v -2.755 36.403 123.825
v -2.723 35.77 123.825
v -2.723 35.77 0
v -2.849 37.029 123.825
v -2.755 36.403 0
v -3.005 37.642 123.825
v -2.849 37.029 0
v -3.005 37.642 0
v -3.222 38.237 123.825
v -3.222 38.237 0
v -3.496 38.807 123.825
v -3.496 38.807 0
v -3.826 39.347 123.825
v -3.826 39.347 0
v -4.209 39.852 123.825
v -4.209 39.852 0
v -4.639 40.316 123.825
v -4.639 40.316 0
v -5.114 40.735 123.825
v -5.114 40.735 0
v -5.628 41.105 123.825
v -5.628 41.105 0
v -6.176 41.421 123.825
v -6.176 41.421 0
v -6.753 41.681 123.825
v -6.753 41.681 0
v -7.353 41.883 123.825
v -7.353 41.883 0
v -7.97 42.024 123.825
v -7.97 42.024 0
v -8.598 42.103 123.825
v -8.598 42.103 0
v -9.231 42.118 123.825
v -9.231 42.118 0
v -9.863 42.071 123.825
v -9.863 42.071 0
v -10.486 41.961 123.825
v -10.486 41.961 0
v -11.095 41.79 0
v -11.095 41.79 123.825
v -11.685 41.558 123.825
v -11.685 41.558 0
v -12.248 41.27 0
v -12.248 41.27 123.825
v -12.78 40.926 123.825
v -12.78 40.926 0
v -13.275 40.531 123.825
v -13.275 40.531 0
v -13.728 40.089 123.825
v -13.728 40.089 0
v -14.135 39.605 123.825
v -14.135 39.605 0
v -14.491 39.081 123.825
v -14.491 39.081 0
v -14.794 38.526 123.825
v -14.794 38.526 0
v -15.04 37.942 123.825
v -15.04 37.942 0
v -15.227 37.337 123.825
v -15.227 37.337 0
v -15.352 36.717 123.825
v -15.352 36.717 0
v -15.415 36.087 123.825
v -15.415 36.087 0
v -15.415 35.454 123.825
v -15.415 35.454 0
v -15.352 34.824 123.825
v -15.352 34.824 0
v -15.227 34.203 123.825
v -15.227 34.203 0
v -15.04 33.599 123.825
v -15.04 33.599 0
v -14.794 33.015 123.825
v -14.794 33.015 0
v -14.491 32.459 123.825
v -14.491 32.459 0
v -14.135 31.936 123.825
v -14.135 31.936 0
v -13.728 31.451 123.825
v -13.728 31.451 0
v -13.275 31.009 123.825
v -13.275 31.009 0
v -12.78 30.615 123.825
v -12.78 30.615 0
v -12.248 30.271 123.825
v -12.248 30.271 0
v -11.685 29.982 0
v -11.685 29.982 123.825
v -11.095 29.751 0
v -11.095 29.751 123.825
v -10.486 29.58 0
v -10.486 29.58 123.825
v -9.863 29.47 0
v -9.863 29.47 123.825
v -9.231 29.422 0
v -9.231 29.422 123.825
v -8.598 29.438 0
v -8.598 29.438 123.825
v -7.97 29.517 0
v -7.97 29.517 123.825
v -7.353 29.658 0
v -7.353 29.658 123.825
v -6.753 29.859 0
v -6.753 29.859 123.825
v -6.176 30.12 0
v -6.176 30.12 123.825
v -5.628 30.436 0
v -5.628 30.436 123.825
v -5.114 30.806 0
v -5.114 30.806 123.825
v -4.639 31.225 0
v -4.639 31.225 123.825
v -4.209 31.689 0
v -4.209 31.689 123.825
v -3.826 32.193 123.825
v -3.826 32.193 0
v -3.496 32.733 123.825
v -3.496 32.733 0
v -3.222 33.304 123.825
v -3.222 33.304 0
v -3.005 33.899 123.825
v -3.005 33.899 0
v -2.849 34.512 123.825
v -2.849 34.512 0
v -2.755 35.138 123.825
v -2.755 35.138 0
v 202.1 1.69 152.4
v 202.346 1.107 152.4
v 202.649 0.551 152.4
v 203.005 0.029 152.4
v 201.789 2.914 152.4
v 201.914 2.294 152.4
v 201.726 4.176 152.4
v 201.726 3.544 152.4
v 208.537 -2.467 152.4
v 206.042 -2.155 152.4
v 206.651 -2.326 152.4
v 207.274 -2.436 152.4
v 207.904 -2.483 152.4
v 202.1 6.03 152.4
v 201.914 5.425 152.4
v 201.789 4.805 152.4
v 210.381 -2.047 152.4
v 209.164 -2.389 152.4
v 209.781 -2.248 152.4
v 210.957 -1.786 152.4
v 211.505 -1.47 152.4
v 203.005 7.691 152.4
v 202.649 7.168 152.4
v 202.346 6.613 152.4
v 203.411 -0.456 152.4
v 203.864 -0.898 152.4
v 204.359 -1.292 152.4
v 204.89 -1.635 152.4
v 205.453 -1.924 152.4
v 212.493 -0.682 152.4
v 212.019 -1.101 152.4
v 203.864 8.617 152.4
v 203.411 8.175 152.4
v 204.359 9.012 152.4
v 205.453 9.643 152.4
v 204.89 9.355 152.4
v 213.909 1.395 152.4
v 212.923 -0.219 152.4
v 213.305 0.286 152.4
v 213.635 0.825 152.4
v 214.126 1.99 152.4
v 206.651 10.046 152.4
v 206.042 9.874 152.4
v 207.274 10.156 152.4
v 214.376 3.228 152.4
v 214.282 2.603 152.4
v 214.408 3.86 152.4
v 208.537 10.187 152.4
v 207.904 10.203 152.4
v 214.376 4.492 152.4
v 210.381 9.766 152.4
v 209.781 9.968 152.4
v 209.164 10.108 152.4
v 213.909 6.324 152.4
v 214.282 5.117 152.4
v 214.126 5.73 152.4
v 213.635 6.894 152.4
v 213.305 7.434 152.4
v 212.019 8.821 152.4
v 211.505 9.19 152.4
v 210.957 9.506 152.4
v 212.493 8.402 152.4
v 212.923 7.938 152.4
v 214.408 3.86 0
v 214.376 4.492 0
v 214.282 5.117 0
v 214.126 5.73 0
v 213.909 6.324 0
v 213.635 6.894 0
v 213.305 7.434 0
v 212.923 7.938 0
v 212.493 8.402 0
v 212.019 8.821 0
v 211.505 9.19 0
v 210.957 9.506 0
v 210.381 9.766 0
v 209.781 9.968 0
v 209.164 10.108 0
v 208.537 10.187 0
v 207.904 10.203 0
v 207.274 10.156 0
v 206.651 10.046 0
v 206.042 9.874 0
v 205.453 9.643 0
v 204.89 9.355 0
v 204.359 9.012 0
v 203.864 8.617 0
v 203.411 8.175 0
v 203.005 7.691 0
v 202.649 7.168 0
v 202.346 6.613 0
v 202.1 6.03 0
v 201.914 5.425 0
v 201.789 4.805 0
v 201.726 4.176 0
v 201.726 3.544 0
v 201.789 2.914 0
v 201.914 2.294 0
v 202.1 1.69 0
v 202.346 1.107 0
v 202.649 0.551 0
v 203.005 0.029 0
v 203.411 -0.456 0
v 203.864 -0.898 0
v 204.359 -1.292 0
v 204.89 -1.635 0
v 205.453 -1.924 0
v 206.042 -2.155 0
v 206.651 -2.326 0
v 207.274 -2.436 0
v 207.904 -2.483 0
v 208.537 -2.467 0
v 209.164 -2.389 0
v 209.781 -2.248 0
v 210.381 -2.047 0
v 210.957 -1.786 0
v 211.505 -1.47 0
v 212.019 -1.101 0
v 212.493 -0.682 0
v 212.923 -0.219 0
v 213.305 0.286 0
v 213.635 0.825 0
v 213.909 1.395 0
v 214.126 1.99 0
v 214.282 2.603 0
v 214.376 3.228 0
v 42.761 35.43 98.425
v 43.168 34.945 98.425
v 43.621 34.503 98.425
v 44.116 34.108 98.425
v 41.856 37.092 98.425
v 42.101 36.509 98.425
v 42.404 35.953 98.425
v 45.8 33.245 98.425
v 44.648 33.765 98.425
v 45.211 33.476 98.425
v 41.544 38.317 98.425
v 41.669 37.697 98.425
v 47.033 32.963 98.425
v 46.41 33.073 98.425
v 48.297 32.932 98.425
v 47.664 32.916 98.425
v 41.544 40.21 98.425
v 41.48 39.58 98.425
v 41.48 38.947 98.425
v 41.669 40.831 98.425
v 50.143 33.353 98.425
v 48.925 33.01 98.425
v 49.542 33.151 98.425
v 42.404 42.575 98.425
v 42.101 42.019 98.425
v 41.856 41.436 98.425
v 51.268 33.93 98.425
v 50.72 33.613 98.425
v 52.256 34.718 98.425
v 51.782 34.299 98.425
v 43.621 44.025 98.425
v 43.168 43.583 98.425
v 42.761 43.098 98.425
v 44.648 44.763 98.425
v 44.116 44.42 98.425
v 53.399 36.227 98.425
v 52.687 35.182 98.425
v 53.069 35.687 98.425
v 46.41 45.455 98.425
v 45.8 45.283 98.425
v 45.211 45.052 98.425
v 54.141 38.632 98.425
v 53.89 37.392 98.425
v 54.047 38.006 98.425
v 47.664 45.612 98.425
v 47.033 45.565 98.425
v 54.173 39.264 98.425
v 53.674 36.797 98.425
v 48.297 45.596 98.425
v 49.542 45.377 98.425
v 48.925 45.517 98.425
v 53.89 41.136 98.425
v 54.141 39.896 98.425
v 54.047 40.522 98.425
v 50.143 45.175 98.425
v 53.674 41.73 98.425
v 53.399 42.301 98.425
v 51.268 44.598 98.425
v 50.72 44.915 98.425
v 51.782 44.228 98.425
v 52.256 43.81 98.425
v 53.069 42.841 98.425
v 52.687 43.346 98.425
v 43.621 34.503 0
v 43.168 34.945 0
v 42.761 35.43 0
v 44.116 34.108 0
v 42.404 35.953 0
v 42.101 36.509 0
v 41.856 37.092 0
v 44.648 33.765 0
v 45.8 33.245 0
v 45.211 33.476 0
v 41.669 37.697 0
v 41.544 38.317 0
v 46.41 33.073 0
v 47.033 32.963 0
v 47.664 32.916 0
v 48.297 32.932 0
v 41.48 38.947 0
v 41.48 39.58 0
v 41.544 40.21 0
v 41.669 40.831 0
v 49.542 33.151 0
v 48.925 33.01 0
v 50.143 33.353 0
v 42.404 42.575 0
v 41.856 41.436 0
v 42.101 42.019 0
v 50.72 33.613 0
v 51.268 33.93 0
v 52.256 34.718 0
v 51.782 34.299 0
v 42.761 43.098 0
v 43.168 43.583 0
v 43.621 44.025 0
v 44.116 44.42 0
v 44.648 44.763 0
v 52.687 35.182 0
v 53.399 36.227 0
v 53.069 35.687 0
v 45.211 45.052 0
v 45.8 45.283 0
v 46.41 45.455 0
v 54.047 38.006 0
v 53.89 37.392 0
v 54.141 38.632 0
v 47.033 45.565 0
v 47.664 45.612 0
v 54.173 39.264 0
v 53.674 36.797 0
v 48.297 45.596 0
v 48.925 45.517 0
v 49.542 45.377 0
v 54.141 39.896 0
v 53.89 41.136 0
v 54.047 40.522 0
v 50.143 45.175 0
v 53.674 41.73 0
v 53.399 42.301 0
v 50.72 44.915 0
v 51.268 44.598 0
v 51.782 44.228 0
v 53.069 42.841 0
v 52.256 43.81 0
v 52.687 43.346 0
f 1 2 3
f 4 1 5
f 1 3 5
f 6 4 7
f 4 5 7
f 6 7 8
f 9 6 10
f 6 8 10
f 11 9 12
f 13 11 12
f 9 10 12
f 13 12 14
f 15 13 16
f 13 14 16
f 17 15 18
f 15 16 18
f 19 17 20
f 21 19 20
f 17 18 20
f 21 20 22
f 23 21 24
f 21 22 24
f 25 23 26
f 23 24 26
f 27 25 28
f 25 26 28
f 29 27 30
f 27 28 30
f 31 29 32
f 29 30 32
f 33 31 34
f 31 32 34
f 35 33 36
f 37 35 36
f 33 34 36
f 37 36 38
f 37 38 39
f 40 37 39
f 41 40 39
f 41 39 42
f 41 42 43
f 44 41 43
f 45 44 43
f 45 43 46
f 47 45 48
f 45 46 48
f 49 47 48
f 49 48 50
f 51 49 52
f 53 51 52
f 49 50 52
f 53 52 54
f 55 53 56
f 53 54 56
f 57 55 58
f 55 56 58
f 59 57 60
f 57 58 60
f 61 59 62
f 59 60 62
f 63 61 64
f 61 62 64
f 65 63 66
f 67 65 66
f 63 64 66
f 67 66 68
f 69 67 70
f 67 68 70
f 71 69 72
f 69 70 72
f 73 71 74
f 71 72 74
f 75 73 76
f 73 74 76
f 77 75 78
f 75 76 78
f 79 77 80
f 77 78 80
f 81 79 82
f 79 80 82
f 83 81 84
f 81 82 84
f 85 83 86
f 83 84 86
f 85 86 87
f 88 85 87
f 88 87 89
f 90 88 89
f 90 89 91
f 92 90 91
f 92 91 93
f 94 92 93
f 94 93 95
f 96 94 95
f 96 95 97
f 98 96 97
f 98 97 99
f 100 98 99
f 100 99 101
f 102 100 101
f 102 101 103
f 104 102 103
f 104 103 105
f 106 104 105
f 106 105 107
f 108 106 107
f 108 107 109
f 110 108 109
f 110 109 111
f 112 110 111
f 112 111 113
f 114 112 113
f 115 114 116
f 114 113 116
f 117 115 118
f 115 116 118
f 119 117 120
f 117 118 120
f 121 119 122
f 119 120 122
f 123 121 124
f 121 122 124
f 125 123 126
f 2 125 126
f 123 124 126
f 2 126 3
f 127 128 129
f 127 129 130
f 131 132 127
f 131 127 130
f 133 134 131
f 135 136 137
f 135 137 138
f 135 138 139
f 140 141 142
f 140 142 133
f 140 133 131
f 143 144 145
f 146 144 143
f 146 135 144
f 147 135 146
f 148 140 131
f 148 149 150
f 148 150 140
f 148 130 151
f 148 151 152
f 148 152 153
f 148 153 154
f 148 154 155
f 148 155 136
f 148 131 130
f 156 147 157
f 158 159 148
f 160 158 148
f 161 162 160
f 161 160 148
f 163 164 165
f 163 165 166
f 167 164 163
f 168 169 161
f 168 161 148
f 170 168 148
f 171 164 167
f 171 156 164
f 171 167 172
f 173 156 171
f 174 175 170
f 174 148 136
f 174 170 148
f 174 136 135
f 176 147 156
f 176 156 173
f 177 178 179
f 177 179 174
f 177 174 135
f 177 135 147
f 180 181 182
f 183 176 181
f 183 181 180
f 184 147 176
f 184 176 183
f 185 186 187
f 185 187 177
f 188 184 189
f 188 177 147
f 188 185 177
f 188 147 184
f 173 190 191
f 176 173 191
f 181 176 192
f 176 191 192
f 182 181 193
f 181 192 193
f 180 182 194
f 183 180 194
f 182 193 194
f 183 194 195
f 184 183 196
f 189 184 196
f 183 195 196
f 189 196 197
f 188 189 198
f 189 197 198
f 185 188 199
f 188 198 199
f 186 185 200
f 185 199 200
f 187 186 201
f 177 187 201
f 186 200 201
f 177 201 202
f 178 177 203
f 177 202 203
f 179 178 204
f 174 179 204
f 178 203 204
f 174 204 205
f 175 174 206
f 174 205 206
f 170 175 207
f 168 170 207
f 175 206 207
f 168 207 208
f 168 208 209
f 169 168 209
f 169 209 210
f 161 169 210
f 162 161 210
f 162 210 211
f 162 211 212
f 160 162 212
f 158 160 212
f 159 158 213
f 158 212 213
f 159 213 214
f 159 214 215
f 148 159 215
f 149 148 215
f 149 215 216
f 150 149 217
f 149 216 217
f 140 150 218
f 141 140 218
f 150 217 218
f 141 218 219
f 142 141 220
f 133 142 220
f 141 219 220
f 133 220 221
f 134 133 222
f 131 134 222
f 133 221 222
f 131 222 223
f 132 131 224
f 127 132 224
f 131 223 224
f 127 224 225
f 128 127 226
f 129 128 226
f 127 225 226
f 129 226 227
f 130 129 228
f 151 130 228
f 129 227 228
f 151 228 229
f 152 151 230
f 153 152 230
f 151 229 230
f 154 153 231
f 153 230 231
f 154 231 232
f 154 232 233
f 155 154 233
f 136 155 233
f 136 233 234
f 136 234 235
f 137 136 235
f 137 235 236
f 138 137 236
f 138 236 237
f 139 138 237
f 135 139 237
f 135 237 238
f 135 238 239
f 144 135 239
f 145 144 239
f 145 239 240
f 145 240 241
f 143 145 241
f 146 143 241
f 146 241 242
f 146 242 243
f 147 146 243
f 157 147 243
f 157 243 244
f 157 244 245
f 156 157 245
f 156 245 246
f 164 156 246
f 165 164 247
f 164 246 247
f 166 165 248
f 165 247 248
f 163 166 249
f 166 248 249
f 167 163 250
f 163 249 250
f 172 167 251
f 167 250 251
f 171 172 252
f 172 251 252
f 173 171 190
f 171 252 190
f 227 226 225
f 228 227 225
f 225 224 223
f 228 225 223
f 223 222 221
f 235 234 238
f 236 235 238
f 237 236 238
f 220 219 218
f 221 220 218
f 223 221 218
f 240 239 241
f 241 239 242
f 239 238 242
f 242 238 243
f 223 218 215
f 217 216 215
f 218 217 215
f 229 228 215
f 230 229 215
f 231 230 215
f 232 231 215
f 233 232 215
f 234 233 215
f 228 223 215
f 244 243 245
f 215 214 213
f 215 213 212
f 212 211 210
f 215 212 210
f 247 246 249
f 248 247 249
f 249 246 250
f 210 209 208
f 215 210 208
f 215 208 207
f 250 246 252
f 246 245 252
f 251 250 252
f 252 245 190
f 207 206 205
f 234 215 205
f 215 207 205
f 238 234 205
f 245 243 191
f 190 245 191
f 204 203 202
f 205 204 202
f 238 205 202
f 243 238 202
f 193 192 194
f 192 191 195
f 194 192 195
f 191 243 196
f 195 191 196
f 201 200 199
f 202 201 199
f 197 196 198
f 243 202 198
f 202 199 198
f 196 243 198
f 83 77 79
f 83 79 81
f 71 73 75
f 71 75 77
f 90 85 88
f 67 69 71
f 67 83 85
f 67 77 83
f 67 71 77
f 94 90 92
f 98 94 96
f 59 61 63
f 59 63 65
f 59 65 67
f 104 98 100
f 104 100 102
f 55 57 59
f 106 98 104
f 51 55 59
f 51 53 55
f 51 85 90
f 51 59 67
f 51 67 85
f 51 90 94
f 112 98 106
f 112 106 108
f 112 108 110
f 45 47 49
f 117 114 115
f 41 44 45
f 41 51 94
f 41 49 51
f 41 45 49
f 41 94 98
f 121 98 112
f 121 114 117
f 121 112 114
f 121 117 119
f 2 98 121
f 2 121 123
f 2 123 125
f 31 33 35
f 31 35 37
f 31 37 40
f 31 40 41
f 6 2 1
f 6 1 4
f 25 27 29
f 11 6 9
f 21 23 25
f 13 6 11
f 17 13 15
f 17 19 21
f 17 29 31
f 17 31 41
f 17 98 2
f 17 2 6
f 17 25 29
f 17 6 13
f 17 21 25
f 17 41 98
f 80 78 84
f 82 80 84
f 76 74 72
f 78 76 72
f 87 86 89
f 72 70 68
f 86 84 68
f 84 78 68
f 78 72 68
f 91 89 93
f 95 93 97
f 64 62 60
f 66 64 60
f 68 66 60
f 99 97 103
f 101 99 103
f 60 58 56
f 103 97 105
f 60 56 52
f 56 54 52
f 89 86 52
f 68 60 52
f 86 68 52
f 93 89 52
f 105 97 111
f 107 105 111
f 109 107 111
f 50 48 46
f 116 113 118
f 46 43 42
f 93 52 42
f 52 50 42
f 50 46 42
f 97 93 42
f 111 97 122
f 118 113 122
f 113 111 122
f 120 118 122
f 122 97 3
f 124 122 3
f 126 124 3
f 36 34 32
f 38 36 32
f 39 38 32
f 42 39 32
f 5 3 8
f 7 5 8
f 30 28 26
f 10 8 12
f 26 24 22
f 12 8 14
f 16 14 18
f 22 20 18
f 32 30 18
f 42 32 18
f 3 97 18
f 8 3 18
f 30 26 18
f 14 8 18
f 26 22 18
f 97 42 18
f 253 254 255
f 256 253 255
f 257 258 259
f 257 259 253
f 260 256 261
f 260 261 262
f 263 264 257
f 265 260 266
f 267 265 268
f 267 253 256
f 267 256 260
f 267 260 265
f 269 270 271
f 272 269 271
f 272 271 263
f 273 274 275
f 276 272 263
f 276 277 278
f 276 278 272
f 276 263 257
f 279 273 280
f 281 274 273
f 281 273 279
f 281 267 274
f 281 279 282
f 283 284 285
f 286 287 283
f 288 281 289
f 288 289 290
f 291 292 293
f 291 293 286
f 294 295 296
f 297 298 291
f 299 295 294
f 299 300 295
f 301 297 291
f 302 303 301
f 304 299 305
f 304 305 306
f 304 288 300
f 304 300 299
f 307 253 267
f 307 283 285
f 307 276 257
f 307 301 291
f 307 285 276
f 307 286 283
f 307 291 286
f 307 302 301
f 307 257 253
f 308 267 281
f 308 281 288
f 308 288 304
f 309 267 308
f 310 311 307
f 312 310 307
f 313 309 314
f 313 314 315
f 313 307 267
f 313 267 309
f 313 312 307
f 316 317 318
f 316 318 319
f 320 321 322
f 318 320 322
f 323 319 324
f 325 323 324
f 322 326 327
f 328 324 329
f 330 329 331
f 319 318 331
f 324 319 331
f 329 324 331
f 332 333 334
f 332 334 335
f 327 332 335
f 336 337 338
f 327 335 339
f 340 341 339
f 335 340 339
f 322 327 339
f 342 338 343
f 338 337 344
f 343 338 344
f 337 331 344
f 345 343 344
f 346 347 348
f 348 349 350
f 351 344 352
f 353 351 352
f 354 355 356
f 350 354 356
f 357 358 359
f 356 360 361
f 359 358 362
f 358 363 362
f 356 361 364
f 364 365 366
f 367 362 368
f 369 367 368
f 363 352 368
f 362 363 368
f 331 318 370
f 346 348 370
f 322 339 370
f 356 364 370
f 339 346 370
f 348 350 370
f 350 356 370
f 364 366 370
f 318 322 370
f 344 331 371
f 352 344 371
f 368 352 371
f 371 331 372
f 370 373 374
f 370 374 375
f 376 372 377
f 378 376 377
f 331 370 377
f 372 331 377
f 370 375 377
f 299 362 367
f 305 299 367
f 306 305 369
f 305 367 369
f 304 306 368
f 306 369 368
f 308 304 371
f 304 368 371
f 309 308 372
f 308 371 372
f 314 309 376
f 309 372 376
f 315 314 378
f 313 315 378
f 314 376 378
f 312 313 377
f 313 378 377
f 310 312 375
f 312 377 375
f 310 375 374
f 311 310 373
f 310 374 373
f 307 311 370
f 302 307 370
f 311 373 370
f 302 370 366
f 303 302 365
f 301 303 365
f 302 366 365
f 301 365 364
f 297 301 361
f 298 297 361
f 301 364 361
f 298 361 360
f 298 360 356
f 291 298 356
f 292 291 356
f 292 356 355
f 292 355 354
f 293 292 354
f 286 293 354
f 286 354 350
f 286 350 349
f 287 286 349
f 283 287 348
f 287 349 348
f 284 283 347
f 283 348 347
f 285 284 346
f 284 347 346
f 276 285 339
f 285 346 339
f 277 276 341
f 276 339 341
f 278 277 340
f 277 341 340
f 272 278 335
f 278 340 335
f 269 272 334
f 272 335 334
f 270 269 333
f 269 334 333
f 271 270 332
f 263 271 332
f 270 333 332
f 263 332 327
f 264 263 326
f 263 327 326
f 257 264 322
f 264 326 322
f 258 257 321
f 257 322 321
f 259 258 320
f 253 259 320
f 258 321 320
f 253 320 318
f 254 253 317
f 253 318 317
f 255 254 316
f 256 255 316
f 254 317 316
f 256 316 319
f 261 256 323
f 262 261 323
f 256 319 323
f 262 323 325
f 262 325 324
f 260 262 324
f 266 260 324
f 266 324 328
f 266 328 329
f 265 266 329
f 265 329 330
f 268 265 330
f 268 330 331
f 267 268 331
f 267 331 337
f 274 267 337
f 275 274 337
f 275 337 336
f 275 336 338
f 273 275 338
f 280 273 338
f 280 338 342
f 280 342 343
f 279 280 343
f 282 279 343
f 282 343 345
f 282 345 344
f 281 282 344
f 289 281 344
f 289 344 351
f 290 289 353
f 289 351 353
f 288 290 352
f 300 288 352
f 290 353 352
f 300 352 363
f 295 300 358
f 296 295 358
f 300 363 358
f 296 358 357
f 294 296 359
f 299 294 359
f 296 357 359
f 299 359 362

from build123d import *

# Parameters (mm, degrees)
F0_R     = 6.344964
F1_DEPTH = 152.4
F2_R     = 6.35
F3_DEPTH = 98.425
F4_R     = 6.35
F5_DEPTH = 123.825


with BuildPart() as f1:
    # F0 (on Top) → F1 (new body)
    with BuildSketch(Plane.XY):
        with Locations((208.062679, 3.859816)):
            Circle(F0_R)
    extrude(amount=F1_DEPTH)


with BuildPart() as f3:
    # F2 (on Top) → F3 (new body)
    with BuildSketch(Plane.XY):
        with Locations((47.822595, 39.263844)):
            Circle(F2_R)
    extrude(amount=F3_DEPTH)


with BuildPart() as f5:
    # F4 (on Top) → F5 (new body)
    with BuildSketch(Plane.XY):
        with Locations((-9.07302, 35.770386)):
            Circle(F4_R)
    extrude(amount=F5_DEPTH)


solid = Compound([f1.part, f3.part, f5.part])
